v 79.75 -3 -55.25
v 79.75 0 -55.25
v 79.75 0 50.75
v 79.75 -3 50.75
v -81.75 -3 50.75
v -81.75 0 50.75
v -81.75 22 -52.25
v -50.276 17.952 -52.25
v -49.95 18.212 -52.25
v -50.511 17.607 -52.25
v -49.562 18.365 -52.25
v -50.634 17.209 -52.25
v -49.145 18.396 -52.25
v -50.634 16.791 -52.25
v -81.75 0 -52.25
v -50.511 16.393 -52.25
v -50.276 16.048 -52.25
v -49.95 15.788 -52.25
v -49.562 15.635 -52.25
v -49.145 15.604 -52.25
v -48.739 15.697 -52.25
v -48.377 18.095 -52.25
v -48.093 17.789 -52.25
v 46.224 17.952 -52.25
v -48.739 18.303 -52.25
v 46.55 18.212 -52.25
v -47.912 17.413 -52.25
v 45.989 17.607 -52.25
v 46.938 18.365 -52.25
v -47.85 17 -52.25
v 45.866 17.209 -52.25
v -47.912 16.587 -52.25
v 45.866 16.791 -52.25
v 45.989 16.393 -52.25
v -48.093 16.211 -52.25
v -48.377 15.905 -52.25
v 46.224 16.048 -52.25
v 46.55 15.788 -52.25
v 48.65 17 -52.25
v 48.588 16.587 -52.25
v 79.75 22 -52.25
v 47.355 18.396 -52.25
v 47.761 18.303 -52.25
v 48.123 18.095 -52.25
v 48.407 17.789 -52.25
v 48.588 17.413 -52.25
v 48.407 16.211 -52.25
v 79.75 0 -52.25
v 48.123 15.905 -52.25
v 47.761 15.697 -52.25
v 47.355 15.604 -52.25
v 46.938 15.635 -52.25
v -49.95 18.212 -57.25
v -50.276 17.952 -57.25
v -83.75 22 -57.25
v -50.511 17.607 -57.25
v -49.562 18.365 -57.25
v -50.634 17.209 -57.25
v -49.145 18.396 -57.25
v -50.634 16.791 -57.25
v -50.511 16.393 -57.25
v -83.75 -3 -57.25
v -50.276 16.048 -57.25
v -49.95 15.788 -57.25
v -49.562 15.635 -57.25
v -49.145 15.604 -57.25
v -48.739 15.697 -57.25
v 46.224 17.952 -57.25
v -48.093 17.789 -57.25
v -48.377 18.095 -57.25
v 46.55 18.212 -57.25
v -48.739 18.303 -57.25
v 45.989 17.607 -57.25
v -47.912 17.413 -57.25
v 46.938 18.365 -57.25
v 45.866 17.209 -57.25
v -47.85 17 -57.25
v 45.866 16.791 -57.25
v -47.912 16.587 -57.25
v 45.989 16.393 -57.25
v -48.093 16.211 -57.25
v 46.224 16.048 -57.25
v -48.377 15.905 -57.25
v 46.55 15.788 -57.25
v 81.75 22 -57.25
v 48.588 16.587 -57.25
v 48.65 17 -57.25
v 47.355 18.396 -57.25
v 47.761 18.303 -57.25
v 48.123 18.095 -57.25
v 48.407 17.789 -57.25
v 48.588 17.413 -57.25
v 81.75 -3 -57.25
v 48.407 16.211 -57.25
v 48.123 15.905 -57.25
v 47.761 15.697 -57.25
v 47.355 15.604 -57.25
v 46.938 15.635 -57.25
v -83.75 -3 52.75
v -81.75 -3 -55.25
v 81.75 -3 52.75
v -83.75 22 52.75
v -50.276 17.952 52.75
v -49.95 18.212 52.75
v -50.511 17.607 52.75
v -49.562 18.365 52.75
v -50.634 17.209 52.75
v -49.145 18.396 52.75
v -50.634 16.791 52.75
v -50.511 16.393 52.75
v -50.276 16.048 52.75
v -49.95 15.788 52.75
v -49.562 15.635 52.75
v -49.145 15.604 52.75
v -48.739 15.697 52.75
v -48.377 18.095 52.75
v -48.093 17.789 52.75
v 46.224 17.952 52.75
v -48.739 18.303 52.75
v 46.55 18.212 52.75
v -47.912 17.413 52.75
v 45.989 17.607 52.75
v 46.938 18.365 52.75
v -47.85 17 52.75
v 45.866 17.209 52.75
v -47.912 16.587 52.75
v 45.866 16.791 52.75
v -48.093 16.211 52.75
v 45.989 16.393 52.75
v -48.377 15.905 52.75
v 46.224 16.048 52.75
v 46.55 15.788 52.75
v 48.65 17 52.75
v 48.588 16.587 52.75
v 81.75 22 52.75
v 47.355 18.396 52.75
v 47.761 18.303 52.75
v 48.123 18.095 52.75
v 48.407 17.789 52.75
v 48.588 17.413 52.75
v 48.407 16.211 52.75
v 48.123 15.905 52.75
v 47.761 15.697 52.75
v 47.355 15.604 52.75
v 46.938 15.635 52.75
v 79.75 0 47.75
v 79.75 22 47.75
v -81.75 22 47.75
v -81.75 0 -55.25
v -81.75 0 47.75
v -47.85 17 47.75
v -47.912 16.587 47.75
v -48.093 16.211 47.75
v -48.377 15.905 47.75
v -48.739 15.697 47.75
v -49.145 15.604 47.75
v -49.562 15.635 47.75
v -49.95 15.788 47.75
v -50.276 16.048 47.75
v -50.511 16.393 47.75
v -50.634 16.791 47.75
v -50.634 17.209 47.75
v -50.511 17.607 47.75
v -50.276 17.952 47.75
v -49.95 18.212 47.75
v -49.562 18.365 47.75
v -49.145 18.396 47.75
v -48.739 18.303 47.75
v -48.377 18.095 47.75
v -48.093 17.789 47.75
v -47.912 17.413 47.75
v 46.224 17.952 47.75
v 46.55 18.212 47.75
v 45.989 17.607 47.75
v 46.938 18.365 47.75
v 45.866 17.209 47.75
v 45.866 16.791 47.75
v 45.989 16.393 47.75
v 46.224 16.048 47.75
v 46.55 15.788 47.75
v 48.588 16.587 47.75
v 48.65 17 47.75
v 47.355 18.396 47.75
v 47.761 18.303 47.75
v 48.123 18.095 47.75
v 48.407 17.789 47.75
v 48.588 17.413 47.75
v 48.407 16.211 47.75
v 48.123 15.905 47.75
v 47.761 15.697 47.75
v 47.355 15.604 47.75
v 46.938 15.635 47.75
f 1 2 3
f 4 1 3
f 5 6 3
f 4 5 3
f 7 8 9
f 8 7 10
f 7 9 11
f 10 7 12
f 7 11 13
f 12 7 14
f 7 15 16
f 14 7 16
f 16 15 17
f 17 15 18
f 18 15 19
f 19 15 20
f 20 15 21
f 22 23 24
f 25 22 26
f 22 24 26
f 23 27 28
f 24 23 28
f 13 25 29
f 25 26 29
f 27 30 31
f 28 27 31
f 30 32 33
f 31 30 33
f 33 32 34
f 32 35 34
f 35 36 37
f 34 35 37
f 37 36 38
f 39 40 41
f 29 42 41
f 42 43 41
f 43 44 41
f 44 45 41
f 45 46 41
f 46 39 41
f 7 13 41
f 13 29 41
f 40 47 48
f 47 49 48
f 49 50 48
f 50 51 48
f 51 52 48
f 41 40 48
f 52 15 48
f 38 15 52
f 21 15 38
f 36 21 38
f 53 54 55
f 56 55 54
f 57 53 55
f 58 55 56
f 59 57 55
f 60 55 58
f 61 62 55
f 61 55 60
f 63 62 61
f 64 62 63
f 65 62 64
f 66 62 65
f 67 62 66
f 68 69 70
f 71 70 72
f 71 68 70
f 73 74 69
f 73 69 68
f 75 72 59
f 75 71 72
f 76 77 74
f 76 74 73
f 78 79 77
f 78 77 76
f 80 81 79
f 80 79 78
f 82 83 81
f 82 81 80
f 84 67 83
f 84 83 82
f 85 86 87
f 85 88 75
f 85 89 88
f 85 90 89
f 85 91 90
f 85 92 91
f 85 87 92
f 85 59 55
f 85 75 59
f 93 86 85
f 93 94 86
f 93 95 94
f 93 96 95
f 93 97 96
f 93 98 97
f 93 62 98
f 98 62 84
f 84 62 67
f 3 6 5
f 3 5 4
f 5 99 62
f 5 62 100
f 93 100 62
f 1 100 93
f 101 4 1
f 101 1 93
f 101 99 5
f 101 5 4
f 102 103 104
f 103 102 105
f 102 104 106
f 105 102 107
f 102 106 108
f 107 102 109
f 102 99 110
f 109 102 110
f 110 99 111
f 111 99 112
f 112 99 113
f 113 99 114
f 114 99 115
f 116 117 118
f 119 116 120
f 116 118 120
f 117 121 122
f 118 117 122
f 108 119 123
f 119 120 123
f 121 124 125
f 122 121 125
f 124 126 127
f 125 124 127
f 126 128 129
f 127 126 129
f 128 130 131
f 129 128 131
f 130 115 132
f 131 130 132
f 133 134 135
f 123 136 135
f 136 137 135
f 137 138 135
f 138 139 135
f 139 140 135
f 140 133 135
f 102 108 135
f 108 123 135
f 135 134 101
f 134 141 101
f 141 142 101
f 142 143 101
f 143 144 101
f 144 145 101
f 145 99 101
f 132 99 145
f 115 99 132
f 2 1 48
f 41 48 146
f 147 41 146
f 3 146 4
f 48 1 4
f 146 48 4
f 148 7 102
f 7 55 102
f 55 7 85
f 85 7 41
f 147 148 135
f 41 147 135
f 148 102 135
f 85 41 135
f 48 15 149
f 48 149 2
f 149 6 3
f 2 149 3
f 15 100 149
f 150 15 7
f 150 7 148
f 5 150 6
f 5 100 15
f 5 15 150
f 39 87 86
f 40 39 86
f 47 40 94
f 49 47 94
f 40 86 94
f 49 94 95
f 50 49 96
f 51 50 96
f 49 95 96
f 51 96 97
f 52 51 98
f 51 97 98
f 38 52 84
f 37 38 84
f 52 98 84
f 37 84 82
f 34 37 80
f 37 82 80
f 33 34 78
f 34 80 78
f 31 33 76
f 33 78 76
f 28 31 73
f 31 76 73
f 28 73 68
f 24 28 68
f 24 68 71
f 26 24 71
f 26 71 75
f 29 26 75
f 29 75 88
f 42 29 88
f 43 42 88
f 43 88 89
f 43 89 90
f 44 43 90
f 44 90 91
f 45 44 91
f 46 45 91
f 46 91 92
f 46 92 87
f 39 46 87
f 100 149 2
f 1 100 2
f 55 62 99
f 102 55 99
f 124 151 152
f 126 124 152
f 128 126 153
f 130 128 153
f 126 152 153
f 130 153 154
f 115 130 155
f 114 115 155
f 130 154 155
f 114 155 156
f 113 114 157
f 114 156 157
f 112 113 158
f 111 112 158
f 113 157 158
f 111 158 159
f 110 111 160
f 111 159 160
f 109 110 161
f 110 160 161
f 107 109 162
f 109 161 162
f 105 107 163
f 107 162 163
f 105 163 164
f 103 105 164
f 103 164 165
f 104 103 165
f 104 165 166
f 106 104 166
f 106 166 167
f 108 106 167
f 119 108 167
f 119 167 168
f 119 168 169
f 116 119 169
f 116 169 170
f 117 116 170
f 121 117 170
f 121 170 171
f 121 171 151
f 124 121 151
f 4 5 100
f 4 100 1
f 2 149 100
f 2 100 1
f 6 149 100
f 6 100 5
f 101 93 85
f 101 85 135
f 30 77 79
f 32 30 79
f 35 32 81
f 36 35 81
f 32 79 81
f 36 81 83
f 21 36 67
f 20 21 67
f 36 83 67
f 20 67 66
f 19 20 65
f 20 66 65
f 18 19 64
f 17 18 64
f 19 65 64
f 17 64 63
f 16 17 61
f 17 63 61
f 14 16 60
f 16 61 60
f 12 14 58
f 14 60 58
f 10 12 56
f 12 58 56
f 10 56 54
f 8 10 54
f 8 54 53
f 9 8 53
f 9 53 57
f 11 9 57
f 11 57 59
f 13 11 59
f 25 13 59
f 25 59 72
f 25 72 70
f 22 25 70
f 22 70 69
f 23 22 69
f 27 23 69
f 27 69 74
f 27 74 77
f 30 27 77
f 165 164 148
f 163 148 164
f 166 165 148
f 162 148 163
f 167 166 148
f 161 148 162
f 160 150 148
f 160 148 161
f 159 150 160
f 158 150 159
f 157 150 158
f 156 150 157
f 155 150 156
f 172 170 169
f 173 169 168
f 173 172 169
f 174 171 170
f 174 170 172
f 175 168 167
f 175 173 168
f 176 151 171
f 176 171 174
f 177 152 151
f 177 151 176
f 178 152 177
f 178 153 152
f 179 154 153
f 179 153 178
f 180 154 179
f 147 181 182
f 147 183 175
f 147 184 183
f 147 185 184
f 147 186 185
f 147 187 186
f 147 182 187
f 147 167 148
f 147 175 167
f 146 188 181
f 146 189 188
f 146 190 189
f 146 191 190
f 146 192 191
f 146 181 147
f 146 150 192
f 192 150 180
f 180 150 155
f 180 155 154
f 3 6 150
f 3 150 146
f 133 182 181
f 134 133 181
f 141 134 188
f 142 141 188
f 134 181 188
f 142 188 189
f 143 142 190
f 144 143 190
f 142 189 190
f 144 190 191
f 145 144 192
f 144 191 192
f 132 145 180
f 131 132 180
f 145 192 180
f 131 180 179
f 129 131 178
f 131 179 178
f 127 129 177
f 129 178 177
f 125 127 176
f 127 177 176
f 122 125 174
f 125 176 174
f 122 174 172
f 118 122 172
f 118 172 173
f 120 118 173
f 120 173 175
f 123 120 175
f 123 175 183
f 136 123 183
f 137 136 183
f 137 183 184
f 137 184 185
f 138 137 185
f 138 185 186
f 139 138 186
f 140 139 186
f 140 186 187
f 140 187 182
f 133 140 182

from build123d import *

# Parameters (mm, degrees)
F1_W     = 165.5
F1_H     = 110
F1_W_2   = 161.5
F1_H_2   = 106
F2_DEPTH = 3
F3_W     = 165.5
F3_H     = 110
F3_W_2   = 161.5
F3_H_2   = 100
F4_DEPTH = 22
F5_R     = 1.4
F6_DEPTH = 110.001
F7_W     = 161.5
F7_H     = 106
F8_DEPTH = 3


with BuildPart() as f2:
    # F1 (on Front) → F2 (new body)
    with BuildSketch(Plane.XZ):
        with Locations((-1, -2.25)):
            Rectangle(F1_W, F1_H)
        with Locations((-1, -2.25)):
            Rectangle(F1_W_2, F1_H_2, mode=Mode.SUBTRACT)
    extrude(amount=F2_DEPTH)

    # F3 (on Front) → F4 (join)
    with BuildSketch(Plane.XZ):
        with Locations((-1, -2.25)):
            Rectangle(F3_W, F3_H)
        with Locations((-1, -2.25)):
            Rectangle(F3_W_2, F3_H_2, mode=Mode.SUBTRACT)
    extrude(amount=-F4_DEPTH)

    # F5 (on face) → F6 (cut, through all)
    with BuildSketch(Plane(origin=(0, 0, -57.25), x_dir=(1, 0, 0), z_dir=(0, 0, -1))):
        with Locations((-49.25, -17)):
            Circle(F5_R)
        with Locations((47.25, -17)):
            Circle(F5_R)
    extrude(amount=-F6_DEPTH, mode=Mode.SUBTRACT)


with BuildPart() as f8:
    # F7 (on Front) → F8 (new body)
    with BuildSketch(Plane.XZ):
        with Locations((-1, -2.25)):
            Rectangle(F7_W, F7_H)
    extrude(amount=F8_DEPTH)


solid = Compound([f2.part, f8.part])
